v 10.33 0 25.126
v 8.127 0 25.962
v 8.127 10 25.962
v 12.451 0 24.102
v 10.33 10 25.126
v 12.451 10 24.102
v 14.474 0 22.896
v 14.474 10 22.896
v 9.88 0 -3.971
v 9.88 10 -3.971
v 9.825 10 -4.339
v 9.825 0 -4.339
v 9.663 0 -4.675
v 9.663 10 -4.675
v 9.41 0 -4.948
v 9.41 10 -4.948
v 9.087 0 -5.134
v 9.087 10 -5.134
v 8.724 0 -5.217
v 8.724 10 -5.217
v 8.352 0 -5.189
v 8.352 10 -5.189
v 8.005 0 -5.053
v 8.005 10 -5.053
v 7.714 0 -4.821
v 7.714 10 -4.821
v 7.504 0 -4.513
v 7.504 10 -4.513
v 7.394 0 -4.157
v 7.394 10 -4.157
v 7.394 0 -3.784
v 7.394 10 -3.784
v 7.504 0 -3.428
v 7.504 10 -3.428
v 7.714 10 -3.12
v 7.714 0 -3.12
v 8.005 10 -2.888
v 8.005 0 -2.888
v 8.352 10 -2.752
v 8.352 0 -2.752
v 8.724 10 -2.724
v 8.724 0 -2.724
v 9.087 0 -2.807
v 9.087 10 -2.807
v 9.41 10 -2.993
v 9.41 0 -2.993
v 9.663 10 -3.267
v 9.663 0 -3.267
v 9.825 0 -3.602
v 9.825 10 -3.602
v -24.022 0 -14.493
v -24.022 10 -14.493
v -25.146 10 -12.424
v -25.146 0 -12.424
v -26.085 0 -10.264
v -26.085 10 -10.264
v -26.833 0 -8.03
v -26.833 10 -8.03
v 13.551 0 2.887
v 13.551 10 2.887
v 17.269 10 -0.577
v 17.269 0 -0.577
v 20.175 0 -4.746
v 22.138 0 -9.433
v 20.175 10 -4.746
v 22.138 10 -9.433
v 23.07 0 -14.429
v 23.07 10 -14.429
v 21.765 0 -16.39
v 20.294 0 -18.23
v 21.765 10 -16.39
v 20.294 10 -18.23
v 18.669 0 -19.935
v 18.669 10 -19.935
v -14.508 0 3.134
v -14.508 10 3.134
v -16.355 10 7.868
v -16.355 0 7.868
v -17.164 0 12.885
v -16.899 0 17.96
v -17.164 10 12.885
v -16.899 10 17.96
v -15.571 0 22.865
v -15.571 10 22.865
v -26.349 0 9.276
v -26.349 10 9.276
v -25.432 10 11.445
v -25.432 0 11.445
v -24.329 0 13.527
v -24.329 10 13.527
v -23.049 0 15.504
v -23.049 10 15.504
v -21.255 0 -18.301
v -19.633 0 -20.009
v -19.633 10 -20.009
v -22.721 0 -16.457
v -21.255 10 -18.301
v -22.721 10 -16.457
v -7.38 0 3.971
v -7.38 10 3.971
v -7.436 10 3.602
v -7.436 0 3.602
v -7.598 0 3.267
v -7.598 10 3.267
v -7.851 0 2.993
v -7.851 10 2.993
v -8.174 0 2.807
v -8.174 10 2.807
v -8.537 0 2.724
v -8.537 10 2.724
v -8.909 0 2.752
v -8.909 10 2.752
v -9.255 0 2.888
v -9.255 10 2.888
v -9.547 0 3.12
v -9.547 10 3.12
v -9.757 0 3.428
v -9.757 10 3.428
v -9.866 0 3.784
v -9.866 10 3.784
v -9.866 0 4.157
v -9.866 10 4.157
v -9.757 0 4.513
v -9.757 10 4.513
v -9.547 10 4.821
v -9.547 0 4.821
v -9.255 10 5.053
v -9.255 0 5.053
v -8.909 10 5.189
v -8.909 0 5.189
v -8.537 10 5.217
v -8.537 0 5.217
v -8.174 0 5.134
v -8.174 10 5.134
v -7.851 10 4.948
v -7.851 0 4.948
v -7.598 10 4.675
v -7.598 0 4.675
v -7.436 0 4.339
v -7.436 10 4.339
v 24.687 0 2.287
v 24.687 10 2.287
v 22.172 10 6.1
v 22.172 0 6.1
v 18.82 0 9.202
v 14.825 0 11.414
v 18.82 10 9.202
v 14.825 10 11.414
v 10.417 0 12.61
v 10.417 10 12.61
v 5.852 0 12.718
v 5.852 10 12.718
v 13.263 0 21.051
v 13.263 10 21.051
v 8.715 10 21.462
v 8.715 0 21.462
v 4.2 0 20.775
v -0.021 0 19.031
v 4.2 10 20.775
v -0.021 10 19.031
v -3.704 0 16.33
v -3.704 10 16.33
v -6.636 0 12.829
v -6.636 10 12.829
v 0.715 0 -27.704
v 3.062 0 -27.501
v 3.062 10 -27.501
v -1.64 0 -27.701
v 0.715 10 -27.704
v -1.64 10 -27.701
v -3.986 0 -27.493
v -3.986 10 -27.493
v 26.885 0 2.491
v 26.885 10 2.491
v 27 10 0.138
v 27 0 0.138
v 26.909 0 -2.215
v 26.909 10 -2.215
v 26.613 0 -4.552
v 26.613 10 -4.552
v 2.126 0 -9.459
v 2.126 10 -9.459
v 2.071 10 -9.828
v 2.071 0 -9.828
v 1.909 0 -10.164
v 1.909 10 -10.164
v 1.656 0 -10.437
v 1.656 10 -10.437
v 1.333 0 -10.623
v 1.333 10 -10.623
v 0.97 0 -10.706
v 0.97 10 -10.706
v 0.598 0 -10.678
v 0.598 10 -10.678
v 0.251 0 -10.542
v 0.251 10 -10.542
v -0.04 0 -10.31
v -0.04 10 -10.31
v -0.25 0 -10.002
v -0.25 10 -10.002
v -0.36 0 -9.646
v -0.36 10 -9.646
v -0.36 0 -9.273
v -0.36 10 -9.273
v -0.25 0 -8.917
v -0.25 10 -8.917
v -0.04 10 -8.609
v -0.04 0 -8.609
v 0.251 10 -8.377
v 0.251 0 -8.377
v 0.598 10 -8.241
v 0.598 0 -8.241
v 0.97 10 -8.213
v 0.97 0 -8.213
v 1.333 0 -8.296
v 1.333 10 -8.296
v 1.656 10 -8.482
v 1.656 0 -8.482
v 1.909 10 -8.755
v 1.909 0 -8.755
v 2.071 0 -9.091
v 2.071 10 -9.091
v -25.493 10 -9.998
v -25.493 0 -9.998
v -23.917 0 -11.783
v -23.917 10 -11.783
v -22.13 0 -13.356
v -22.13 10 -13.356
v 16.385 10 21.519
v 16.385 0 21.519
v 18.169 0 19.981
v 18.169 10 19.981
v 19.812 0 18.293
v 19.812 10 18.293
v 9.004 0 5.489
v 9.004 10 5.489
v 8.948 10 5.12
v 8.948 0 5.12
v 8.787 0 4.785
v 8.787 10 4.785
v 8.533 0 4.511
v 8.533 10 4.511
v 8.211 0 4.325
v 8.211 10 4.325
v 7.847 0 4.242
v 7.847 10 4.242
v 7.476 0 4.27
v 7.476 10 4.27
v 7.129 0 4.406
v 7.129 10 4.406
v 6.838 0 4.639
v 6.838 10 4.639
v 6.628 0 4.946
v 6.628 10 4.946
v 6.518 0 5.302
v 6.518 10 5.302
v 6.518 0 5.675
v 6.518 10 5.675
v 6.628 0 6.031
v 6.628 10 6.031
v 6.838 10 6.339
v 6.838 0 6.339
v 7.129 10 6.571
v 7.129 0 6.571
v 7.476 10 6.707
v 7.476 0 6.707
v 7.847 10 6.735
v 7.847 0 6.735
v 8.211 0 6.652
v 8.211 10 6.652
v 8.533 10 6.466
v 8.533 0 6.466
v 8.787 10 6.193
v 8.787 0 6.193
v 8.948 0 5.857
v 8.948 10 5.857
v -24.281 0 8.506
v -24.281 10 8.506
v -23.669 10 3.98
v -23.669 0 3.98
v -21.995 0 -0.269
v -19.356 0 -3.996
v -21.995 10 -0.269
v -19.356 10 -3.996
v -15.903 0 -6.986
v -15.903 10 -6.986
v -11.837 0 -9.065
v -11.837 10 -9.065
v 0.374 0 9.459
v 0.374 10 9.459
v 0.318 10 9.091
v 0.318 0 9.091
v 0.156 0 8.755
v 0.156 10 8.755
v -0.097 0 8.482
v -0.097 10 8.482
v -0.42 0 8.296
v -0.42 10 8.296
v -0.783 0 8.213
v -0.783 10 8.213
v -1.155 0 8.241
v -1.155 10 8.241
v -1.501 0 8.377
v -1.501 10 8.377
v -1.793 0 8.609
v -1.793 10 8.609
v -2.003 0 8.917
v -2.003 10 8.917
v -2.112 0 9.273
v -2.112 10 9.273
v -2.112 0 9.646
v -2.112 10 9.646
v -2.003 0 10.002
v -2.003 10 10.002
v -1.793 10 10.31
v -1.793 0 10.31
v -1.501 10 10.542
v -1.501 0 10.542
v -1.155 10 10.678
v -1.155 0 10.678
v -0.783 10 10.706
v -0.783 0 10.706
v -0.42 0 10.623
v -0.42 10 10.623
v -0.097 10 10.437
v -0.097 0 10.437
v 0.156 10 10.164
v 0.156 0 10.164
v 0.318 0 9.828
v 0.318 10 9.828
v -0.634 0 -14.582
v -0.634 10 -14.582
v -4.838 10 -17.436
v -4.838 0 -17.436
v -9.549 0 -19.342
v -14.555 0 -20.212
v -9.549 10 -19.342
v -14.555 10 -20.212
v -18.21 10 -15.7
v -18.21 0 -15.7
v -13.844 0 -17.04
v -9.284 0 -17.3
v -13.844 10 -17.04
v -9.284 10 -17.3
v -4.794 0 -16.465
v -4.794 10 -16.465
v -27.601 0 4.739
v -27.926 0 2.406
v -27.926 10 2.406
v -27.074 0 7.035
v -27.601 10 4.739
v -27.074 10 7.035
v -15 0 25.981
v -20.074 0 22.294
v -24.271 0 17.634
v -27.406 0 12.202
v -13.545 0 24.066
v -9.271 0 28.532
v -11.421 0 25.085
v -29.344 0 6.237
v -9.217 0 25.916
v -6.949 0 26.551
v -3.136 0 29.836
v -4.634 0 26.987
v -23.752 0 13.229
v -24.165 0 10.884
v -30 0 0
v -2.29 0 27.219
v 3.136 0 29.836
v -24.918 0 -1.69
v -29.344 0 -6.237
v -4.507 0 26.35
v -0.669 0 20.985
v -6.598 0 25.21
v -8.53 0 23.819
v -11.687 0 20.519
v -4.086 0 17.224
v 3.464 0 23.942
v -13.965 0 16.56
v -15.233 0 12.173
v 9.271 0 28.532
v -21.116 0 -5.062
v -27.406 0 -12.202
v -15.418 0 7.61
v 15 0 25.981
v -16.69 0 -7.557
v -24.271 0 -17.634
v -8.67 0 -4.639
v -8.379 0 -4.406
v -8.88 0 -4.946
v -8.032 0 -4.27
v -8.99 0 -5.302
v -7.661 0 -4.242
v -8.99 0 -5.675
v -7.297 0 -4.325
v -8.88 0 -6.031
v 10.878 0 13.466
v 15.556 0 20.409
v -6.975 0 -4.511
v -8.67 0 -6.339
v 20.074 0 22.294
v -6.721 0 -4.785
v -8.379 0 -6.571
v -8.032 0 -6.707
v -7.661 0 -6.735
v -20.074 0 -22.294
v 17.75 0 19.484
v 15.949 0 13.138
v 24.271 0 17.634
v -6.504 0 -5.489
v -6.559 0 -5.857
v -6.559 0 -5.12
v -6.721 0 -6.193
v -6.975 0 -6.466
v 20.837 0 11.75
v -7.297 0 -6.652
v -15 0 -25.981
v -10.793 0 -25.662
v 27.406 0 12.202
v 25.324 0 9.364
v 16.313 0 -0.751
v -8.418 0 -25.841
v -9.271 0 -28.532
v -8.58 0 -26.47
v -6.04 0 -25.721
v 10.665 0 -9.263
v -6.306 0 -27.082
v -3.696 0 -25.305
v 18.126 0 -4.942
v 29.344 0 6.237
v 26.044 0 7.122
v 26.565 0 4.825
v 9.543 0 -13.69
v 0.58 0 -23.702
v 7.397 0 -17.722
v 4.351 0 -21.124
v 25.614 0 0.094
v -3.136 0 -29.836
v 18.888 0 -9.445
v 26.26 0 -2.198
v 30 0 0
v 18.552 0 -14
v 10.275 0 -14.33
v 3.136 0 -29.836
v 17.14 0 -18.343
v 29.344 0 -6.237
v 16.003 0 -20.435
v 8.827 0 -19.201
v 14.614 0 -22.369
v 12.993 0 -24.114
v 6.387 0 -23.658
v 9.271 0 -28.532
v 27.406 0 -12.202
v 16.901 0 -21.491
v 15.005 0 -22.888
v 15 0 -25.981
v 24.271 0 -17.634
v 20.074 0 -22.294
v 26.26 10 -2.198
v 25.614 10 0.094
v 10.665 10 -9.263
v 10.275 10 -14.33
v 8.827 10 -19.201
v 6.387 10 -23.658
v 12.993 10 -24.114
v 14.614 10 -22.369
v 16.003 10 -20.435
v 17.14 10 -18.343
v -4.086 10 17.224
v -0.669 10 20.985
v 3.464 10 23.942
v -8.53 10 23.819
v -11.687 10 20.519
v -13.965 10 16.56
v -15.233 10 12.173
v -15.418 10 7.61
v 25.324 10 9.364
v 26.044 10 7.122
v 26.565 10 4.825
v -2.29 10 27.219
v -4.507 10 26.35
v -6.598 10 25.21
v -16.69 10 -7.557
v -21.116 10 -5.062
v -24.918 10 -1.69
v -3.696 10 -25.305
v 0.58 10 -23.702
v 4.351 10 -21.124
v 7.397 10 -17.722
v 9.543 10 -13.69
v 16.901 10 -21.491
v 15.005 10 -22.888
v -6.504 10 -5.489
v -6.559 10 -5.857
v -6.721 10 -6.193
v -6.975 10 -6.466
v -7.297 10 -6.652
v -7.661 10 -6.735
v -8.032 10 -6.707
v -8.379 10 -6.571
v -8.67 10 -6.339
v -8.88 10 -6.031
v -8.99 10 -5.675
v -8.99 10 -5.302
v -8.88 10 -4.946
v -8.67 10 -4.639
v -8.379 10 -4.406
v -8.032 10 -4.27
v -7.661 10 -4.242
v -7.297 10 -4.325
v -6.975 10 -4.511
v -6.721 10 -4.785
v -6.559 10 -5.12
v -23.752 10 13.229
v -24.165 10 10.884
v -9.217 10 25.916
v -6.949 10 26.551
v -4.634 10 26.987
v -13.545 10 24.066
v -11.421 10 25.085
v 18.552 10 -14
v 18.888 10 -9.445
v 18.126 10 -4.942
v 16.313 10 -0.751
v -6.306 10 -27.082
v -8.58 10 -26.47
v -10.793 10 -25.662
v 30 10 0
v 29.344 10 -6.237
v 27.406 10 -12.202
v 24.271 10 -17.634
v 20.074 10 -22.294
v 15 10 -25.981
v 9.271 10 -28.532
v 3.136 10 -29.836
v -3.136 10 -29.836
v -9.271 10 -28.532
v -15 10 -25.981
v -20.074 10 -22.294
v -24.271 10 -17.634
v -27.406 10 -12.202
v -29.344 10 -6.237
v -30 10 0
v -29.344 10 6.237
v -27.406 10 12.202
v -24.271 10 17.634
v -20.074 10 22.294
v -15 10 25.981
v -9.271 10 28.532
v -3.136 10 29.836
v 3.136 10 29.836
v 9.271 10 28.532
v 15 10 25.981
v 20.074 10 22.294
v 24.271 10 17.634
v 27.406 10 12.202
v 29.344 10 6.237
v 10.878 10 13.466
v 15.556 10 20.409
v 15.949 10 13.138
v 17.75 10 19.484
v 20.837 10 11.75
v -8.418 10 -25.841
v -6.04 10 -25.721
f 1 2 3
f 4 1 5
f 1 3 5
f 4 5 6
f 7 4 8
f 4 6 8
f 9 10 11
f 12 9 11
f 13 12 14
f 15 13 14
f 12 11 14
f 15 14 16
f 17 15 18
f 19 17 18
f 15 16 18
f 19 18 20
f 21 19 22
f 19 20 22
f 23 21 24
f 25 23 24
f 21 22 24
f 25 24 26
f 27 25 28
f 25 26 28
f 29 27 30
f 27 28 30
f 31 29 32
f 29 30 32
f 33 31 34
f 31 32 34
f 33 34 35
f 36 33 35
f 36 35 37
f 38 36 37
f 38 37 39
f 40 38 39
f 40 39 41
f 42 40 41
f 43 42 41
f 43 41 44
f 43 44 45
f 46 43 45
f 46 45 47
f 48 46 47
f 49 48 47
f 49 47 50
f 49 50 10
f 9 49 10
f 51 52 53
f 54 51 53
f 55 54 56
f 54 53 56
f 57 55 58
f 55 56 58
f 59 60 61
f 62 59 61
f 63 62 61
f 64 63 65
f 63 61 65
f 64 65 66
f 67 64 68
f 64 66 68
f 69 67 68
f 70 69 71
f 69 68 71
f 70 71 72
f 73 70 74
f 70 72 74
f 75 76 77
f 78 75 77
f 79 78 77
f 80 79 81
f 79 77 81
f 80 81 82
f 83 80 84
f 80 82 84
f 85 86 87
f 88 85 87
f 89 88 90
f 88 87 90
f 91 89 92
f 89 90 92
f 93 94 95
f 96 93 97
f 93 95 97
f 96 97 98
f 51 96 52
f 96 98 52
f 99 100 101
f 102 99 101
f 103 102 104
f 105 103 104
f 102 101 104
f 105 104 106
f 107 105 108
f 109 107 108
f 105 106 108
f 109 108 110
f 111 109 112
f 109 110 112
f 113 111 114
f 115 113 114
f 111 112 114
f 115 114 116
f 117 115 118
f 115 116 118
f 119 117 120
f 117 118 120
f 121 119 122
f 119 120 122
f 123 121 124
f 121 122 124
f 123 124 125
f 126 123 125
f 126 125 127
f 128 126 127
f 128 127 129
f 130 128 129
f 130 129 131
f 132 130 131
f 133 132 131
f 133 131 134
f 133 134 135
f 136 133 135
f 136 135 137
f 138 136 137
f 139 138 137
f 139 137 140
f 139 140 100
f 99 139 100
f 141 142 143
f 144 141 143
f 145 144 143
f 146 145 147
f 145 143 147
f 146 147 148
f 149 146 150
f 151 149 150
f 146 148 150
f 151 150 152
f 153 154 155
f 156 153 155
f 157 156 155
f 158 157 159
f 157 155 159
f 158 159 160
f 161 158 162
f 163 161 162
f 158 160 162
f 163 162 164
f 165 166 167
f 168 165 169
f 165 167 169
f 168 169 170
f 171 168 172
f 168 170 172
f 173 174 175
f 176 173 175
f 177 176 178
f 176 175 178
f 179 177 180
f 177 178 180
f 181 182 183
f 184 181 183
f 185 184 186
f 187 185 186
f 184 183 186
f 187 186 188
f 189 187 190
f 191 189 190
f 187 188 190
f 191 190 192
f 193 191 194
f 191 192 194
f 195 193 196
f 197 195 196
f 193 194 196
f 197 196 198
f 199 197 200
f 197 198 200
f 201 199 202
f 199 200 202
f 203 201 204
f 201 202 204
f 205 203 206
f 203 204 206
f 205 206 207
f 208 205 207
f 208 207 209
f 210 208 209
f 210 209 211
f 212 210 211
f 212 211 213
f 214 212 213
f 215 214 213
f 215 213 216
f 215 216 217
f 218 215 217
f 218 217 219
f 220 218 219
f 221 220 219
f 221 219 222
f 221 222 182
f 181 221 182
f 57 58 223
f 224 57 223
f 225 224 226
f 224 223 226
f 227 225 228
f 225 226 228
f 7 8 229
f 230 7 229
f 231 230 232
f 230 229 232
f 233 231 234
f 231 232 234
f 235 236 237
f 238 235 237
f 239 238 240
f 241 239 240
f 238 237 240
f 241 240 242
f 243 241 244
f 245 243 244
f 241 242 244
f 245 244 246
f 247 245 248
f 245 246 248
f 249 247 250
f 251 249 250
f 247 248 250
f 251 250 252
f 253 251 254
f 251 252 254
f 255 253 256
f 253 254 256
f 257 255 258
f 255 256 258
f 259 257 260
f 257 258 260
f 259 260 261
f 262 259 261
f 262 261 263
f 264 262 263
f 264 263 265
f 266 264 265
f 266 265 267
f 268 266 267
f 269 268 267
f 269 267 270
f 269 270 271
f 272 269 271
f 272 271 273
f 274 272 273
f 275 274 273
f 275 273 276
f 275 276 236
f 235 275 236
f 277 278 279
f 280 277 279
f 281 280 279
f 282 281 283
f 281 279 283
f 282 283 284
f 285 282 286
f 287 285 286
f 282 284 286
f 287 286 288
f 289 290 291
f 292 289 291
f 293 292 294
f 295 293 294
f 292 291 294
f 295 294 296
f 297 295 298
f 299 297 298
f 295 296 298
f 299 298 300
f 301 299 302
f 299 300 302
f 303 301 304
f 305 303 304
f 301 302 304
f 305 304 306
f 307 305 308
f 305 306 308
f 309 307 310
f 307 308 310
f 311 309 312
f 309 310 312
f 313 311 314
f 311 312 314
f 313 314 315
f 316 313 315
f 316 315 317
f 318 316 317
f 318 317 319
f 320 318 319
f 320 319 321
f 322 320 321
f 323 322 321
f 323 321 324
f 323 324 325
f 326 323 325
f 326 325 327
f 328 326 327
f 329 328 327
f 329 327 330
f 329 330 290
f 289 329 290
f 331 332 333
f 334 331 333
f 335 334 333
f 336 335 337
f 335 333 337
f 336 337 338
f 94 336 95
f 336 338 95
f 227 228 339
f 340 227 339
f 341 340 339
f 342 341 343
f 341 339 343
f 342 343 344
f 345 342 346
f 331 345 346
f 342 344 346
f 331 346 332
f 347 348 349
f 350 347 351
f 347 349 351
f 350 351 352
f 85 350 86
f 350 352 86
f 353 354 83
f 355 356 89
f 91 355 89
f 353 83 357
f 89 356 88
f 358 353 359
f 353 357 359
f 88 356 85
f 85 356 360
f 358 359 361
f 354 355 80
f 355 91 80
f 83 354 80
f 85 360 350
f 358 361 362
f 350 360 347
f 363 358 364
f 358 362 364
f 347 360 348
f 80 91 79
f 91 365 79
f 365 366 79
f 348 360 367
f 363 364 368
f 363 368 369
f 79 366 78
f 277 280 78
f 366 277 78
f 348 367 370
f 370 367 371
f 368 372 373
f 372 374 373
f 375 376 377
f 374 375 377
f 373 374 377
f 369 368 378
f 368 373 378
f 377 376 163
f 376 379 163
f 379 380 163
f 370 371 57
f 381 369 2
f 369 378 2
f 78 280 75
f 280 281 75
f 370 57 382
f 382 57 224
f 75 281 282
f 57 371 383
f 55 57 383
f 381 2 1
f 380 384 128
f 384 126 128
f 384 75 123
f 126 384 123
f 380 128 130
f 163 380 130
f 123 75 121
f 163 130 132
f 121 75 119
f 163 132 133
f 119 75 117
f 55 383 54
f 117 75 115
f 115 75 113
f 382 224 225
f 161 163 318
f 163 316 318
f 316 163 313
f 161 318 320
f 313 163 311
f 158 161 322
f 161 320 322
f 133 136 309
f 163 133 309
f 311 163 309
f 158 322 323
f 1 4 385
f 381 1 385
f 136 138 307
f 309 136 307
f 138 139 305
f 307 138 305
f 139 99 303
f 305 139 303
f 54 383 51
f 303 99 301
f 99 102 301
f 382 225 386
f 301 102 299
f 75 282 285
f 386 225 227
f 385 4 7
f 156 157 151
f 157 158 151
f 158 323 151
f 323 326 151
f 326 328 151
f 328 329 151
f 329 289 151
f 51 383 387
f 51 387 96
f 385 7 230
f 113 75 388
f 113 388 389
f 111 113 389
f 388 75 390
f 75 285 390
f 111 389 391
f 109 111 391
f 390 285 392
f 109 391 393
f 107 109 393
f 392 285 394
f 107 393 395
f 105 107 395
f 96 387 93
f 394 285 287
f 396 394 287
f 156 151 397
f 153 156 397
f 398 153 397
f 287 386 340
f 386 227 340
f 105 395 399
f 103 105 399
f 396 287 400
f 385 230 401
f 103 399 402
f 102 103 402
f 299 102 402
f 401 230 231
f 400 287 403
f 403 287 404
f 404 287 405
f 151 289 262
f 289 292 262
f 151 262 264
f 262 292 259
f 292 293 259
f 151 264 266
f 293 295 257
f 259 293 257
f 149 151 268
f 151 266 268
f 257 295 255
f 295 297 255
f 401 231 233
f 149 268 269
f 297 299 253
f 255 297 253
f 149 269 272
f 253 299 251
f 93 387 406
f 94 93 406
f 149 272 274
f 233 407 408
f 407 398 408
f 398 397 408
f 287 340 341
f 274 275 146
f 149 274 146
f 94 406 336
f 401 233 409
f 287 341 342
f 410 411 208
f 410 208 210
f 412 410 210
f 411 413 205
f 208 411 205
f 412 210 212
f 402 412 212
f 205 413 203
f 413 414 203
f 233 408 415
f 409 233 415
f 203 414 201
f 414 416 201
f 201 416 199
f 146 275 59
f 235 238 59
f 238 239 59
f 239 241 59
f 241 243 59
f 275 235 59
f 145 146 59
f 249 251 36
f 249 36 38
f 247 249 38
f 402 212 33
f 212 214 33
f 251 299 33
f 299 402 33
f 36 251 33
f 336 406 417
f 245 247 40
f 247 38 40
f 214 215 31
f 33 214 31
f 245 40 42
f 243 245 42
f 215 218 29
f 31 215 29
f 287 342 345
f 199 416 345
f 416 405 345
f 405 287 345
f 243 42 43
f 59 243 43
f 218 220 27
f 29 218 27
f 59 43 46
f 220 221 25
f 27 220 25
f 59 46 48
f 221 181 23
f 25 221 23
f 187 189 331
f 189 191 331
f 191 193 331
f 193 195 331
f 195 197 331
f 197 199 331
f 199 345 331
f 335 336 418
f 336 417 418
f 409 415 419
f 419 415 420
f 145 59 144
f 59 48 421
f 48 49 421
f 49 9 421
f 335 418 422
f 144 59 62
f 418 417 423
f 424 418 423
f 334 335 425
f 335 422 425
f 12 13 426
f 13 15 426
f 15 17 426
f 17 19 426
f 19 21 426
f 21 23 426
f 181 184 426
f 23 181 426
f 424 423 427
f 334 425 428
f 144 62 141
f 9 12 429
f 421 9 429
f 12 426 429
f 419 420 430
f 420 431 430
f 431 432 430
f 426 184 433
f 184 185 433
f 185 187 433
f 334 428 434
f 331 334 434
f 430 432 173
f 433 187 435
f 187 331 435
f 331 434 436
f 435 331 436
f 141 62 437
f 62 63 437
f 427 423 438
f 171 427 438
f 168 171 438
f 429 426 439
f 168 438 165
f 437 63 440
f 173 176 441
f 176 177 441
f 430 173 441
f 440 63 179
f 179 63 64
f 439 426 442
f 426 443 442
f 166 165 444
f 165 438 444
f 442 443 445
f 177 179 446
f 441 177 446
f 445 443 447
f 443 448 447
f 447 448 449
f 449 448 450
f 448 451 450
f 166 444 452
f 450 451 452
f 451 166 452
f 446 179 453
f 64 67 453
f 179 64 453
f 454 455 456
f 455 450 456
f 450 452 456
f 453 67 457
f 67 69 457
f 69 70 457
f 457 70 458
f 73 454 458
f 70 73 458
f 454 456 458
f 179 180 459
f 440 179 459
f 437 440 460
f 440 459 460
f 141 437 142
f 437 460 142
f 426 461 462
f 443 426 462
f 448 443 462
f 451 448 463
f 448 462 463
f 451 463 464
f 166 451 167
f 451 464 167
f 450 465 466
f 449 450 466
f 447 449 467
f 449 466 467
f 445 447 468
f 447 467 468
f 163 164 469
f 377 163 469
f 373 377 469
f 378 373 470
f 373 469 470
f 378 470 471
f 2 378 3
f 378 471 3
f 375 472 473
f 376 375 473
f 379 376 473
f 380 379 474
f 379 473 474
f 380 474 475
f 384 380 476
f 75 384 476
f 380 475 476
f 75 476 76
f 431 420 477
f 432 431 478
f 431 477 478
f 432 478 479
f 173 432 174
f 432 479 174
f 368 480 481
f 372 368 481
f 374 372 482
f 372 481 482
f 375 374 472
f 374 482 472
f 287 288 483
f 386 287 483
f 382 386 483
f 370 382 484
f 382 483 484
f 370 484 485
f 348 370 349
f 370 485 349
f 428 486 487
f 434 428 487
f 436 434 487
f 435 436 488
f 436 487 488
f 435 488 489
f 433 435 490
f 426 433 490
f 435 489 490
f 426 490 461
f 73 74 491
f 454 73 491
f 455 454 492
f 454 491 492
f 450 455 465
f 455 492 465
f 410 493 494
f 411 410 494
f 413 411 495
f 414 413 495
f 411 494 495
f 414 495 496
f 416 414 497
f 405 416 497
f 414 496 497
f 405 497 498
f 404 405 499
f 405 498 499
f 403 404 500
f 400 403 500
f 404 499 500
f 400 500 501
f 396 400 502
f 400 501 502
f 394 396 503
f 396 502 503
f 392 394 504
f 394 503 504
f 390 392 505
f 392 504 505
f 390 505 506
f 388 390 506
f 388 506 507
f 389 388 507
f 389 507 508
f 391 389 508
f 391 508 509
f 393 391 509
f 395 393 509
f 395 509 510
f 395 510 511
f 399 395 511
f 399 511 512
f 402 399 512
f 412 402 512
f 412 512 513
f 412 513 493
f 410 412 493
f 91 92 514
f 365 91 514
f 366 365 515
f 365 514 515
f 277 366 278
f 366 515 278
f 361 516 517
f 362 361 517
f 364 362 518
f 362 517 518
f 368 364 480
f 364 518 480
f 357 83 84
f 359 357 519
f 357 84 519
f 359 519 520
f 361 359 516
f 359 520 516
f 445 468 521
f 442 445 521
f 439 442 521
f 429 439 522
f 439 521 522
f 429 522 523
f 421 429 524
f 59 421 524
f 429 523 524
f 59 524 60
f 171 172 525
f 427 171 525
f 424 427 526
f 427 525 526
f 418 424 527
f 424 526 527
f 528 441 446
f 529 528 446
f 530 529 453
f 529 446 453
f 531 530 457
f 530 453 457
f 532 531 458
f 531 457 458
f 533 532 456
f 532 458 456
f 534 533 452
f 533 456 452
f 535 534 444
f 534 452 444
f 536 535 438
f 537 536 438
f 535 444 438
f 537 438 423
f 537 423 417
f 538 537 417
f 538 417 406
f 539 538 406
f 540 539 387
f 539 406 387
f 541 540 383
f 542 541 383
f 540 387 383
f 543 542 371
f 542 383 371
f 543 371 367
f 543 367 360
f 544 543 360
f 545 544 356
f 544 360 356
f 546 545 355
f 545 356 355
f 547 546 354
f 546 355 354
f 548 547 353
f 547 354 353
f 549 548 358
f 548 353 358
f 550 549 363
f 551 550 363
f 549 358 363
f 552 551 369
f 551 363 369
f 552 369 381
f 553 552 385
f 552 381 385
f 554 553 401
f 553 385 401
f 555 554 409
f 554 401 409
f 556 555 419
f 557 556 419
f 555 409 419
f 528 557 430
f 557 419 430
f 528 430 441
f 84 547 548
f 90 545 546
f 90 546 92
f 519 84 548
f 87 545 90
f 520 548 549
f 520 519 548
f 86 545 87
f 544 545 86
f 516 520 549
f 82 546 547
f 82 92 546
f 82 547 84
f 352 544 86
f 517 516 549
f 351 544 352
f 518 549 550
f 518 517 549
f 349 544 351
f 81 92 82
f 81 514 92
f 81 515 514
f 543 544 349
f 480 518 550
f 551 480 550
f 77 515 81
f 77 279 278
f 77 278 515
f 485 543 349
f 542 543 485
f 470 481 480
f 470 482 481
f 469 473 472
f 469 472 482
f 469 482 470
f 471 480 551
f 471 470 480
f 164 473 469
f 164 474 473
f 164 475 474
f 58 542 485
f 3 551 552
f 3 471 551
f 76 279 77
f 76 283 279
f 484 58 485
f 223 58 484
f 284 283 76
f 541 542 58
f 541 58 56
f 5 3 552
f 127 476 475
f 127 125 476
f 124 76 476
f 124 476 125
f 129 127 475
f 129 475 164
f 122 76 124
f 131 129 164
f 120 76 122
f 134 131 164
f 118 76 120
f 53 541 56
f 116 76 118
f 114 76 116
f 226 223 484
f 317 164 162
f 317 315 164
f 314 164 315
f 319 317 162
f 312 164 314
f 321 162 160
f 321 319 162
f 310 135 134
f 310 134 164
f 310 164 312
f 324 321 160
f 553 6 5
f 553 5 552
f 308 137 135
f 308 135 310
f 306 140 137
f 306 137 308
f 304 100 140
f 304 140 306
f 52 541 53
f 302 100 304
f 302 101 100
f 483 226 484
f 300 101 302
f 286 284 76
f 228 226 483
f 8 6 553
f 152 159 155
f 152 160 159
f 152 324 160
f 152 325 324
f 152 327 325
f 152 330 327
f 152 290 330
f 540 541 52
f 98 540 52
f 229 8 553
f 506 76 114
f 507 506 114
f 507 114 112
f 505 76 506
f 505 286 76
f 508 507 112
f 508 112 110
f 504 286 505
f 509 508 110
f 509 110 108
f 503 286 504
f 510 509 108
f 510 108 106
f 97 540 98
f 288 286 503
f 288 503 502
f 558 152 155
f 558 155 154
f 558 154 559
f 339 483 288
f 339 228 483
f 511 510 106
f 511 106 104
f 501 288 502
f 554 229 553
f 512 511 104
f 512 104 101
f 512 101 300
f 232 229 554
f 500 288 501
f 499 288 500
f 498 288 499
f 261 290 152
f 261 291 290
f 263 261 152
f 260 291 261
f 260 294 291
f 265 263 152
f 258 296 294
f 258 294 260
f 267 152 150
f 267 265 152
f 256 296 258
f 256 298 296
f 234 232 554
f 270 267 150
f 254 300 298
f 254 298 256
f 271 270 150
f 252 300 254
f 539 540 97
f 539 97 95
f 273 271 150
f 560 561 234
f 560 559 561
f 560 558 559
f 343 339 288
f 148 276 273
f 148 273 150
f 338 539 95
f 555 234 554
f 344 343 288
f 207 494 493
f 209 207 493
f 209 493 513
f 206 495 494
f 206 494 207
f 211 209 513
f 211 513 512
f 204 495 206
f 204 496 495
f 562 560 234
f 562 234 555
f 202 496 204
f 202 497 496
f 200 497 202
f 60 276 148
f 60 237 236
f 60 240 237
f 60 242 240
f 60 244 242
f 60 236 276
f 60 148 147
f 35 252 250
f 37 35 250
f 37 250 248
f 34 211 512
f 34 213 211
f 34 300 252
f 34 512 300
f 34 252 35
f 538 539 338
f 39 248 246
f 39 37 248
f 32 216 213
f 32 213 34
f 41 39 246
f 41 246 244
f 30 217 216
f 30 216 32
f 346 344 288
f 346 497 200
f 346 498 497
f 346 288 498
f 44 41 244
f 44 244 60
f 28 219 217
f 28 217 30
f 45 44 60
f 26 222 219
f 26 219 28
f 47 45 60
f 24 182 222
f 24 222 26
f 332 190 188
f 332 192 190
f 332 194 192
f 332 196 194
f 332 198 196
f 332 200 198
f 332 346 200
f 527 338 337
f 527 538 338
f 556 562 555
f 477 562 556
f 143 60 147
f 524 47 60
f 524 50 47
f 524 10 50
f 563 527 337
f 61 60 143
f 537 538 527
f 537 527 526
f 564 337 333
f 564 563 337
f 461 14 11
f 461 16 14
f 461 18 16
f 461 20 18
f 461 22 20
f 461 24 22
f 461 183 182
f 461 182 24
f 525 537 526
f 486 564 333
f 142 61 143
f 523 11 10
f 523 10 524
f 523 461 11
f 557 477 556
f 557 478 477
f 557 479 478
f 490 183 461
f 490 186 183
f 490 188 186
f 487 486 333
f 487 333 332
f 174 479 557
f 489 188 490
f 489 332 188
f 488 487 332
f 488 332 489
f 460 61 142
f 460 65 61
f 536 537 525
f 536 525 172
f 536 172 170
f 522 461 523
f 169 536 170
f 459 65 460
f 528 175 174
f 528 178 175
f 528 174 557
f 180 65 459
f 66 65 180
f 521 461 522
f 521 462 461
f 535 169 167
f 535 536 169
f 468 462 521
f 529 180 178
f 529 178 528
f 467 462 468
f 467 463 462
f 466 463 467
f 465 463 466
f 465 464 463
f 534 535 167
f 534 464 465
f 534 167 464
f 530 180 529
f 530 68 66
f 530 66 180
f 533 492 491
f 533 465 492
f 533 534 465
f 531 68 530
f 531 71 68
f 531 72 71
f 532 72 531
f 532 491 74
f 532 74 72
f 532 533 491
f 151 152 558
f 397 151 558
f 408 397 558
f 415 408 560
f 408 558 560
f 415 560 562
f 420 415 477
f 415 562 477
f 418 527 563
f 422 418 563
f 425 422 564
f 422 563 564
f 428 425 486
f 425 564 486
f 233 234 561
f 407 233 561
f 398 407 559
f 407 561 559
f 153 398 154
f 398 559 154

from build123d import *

# Parameters (mm, degrees)
SKETCH1_R           = 30
BOSS_EXTRUDE1_DEPTH = 10
CUT_EXTRUDE1_REACH  = 12
SKETCH2_R           = 1.25
CUT_EXTRUDE4_DEPTH  = 10
CIRPATTERN2_COUNT   = 7


with BuildPart() as part:
    # Sketch1 → Boss-Extrude1 (new body)
    with BuildSketch(Plane(origin=(0, 0, 0), x_dir=(1, 0, 0), z_dir=(0, 1, 0))):
        Circle(SKETCH1_R)
    extrude(amount=BOSS_EXTRUDE1_DEPTH)

    # Sketch2 → Cut-Extrude1 (cut, up to next)
    with BuildSketch(Plane(origin=(0, 10, 0), x_dir=(1, 0, 0), z_dir=(0, 1, 0)), mode=Mode.PRIVATE) as cut_extrude1_sk1:
        with Locations((-7.753929223, 5.488768678)):
            Circle(SKETCH2_R)
    cut_extrude1_tool1 = extrude(cut_extrude1_sk1.sketch, amount=-CUT_EXTRUDE1_REACH, mode=Mode.PRIVATE) & part.part
    add(cut_extrude1_tool1.solids().sort_by_distance((-7.753929, 10, -5.488769))[0], mode=Mode.SUBTRACT)
    # Sketch2 → Cut-Extrude1 (cut, up to next)
    with BuildSketch(Plane(origin=(0, 10, 0), x_dir=(1, 0, 0), z_dir=(0, 1, 0)), mode=Mode.PRIVATE) as cut_extrude1_sk2:
        with Locations((0.876448499, 9.459484025)):
            Circle(SKETCH2_R)
    cut_extrude1_tool2 = extrude(cut_extrude1_sk2.sketch, amount=-CUT_EXTRUDE1_REACH, mode=Mode.PRIVATE) & part.part
    add(cut_extrude1_tool2.solids().sort_by_distance((0.876448, 10, -9.459484))[0], mode=Mode.SUBTRACT)
    # Sketch2 → Cut-Extrude1 (cut, up to next)
    with BuildSketch(Plane(origin=(0, 10, 0), x_dir=(1, 0, 0), z_dir=(0, 1, 0)), mode=Mode.PRIVATE) as cut_extrude1_sk3:
        with Locations((8.630377722, 3.970715347)):
            Circle(SKETCH2_R)
    cut_extrude1_tool3 = extrude(cut_extrude1_sk3.sketch, amount=-CUT_EXTRUDE1_REACH, mode=Mode.PRIVATE) & part.part
    add(cut_extrude1_tool3.solids().sort_by_distance((8.630378, 10, -3.970715))[0], mode=Mode.SUBTRACT)
    # Sketch2 → Cut-Extrude1 (cut, up to next)
    with BuildSketch(Plane(origin=(0, 10, 0), x_dir=(1, 0, 0), z_dir=(0, 1, 0)), mode=Mode.PRIVATE) as cut_extrude1_sk4:
        with Locations((7.753929223, -5.488768678)):
            Circle(SKETCH2_R)
    cut_extrude1_tool4 = extrude(cut_extrude1_sk4.sketch, amount=-CUT_EXTRUDE1_REACH, mode=Mode.PRIVATE) & part.part
    add(cut_extrude1_tool4.solids().sort_by_distance((7.753929, 10, 5.488769))[0], mode=Mode.SUBTRACT)
    # Sketch2 → Cut-Extrude1 (cut, up to next)
    with BuildSketch(Plane(origin=(0, 10, 0), x_dir=(1, 0, 0), z_dir=(0, 1, 0)), mode=Mode.PRIVATE) as cut_extrude1_sk5:
        with Locations((-0.876448499, -9.459484025)):
            Circle(SKETCH2_R)
    cut_extrude1_tool5 = extrude(cut_extrude1_sk5.sketch, amount=-CUT_EXTRUDE1_REACH, mode=Mode.PRIVATE) & part.part
    add(cut_extrude1_tool5.solids().sort_by_distance((-0.876448, 10, 9.459484))[0], mode=Mode.SUBTRACT)
    # Sketch2 → Cut-Extrude1 (cut, up to next)
    with BuildSketch(Plane(origin=(0, 10, 0), x_dir=(1, 0, 0), z_dir=(0, 1, 0)), mode=Mode.PRIVATE) as cut_extrude1_sk6:
        with Locations((-8.630377722, -3.970715347)):
            Circle(SKETCH2_R)
    cut_extrude1_tool6 = extrude(cut_extrude1_sk6.sketch, amount=-CUT_EXTRUDE1_REACH, mode=Mode.PRIVATE) & part.part
    add(cut_extrude1_tool6.solids().sort_by_distance((-8.630378, 10, 3.970715))[0], mode=Mode.SUBTRACT)

    # Sketch6 → Cut-Extrude4 (cut)
    with BuildSketch(Plane(origin=(0, 10, 0), x_dir=(1, 0, 0), z_dir=(0, 1, 0))):
        with BuildLine():
            ThreePointArc((24.68695866, -2.287317978), (16.889428305, -10.428386728), (5.851580512, -12.71845138))
            ThreePointArc((5.851580512, -12.71845138), (15.949007833, -13.13834176), (25.324062707, -9.36439256))
            ThreePointArc((25.324062707, -9.36439256), (26.329710343, -5.978825407), (26.884849336, -2.490958893))
            Line((26.884849336, -2.490958893), (24.68695866, -2.287317978))
        make_face()
        with BuildLine():
            ThreePointArc((26.613477911, 4.552229506), (25.97279828, 1.041593529), (24.68695866, -2.287317978))
            Line((24.68695866, -2.287317978), (26.884849336, -2.490958893))
            ThreePointArc((26.884849336, -2.490958893), (26.979981102, 1.039528618), (26.613477911, 4.552229506))
        make_face()
    cut_extrude4 = extrude(amount=-CUT_EXTRUDE4_DEPTH, mode=Mode.SUBTRACT)

    # CirPattern2: Cut-Extrude4 ×7 about axis
    cirpattern2_axis = Axis((-0.506628383, 0, -0.191712569), (0, 1, 0))
    for i in range(1, CIRPATTERN2_COUNT):
        add(cut_extrude4.rotate(cirpattern2_axis, i * 360 / CIRPATTERN2_COUNT), mode=Mode.SUBTRACT)


solid = part.part
